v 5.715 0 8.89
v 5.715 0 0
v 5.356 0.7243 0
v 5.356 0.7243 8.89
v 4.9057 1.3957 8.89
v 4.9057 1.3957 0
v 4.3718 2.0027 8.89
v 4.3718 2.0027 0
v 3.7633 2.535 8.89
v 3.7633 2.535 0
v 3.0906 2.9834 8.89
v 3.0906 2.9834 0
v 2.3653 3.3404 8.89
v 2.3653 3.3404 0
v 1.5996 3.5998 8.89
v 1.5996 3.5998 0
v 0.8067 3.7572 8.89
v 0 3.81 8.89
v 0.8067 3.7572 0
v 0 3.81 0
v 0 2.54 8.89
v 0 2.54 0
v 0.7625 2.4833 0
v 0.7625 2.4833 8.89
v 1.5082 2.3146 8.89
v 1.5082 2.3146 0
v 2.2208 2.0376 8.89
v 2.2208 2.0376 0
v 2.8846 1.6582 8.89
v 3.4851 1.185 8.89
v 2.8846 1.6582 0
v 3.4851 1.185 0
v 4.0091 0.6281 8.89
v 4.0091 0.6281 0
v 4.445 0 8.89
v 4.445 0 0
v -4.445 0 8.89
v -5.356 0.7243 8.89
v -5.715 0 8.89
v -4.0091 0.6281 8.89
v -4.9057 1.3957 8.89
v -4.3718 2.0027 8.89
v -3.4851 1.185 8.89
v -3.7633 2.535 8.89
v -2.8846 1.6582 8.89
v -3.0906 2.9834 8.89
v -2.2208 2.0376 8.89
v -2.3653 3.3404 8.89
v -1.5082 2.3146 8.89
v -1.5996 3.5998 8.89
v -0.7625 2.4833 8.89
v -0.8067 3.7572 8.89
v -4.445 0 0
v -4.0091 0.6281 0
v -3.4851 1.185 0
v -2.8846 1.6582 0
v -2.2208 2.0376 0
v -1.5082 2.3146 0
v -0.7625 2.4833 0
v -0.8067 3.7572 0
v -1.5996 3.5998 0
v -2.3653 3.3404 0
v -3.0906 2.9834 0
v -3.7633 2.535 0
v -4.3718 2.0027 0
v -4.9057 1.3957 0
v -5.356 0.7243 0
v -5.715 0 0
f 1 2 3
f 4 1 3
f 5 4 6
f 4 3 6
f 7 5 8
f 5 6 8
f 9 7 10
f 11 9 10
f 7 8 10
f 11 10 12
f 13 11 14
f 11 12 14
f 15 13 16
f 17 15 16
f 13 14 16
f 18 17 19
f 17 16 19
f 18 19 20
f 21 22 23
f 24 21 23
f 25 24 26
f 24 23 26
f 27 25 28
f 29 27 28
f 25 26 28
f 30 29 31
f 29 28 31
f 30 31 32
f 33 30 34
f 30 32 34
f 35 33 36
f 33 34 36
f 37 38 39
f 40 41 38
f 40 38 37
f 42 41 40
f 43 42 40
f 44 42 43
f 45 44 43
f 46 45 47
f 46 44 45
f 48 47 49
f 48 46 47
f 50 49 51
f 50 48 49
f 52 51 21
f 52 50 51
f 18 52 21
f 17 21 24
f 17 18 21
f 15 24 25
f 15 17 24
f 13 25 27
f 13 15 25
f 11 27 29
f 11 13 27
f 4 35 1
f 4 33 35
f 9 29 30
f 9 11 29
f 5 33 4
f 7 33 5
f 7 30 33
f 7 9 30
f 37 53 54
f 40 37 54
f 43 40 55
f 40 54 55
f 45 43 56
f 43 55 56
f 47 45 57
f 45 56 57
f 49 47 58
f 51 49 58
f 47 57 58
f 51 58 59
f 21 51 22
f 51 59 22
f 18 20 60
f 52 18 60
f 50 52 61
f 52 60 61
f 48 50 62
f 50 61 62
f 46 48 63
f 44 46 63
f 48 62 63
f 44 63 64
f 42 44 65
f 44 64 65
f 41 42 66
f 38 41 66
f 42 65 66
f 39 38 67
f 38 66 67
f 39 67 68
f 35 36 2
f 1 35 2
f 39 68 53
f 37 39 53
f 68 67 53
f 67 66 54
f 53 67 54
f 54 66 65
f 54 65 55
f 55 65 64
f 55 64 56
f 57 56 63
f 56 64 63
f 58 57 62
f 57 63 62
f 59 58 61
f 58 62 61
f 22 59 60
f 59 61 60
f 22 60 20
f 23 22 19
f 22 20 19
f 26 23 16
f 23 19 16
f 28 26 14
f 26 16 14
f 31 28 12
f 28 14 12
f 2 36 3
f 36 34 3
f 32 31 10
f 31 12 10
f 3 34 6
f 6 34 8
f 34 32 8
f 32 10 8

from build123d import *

# Parameters (mm, degrees)
F1_DEPTH = 8.89


with BuildPart() as f1:
    # F0 (on Top) → F1 (new body)
    with BuildSketch(Plane.XY):
        with BuildLine():
            Line((4.445, 0), (5.715, 0))
            ThreePointArc((5.715, 0), (3.434288, 2.770181), (0, 3.81))
            Line((0, 3.81), (0, 2.54))
            ThreePointArc((0, 2.54), (2.559767, 1.860217), (4.445, 0))
        make_face()
        with BuildLine():
            Line((0, 2.54), (0, 3.81))
            ThreePointArc((0, 3.81), (-3.434288, 2.770181), (-5.715, 0))
            Line((-5.715, 0), (-4.445, 0))
            ThreePointArc((-4.445, 0), (-2.559767, 1.860217), (0, 2.54))
        make_face()
    extrude(amount=F1_DEPTH)


solid = f1.part
